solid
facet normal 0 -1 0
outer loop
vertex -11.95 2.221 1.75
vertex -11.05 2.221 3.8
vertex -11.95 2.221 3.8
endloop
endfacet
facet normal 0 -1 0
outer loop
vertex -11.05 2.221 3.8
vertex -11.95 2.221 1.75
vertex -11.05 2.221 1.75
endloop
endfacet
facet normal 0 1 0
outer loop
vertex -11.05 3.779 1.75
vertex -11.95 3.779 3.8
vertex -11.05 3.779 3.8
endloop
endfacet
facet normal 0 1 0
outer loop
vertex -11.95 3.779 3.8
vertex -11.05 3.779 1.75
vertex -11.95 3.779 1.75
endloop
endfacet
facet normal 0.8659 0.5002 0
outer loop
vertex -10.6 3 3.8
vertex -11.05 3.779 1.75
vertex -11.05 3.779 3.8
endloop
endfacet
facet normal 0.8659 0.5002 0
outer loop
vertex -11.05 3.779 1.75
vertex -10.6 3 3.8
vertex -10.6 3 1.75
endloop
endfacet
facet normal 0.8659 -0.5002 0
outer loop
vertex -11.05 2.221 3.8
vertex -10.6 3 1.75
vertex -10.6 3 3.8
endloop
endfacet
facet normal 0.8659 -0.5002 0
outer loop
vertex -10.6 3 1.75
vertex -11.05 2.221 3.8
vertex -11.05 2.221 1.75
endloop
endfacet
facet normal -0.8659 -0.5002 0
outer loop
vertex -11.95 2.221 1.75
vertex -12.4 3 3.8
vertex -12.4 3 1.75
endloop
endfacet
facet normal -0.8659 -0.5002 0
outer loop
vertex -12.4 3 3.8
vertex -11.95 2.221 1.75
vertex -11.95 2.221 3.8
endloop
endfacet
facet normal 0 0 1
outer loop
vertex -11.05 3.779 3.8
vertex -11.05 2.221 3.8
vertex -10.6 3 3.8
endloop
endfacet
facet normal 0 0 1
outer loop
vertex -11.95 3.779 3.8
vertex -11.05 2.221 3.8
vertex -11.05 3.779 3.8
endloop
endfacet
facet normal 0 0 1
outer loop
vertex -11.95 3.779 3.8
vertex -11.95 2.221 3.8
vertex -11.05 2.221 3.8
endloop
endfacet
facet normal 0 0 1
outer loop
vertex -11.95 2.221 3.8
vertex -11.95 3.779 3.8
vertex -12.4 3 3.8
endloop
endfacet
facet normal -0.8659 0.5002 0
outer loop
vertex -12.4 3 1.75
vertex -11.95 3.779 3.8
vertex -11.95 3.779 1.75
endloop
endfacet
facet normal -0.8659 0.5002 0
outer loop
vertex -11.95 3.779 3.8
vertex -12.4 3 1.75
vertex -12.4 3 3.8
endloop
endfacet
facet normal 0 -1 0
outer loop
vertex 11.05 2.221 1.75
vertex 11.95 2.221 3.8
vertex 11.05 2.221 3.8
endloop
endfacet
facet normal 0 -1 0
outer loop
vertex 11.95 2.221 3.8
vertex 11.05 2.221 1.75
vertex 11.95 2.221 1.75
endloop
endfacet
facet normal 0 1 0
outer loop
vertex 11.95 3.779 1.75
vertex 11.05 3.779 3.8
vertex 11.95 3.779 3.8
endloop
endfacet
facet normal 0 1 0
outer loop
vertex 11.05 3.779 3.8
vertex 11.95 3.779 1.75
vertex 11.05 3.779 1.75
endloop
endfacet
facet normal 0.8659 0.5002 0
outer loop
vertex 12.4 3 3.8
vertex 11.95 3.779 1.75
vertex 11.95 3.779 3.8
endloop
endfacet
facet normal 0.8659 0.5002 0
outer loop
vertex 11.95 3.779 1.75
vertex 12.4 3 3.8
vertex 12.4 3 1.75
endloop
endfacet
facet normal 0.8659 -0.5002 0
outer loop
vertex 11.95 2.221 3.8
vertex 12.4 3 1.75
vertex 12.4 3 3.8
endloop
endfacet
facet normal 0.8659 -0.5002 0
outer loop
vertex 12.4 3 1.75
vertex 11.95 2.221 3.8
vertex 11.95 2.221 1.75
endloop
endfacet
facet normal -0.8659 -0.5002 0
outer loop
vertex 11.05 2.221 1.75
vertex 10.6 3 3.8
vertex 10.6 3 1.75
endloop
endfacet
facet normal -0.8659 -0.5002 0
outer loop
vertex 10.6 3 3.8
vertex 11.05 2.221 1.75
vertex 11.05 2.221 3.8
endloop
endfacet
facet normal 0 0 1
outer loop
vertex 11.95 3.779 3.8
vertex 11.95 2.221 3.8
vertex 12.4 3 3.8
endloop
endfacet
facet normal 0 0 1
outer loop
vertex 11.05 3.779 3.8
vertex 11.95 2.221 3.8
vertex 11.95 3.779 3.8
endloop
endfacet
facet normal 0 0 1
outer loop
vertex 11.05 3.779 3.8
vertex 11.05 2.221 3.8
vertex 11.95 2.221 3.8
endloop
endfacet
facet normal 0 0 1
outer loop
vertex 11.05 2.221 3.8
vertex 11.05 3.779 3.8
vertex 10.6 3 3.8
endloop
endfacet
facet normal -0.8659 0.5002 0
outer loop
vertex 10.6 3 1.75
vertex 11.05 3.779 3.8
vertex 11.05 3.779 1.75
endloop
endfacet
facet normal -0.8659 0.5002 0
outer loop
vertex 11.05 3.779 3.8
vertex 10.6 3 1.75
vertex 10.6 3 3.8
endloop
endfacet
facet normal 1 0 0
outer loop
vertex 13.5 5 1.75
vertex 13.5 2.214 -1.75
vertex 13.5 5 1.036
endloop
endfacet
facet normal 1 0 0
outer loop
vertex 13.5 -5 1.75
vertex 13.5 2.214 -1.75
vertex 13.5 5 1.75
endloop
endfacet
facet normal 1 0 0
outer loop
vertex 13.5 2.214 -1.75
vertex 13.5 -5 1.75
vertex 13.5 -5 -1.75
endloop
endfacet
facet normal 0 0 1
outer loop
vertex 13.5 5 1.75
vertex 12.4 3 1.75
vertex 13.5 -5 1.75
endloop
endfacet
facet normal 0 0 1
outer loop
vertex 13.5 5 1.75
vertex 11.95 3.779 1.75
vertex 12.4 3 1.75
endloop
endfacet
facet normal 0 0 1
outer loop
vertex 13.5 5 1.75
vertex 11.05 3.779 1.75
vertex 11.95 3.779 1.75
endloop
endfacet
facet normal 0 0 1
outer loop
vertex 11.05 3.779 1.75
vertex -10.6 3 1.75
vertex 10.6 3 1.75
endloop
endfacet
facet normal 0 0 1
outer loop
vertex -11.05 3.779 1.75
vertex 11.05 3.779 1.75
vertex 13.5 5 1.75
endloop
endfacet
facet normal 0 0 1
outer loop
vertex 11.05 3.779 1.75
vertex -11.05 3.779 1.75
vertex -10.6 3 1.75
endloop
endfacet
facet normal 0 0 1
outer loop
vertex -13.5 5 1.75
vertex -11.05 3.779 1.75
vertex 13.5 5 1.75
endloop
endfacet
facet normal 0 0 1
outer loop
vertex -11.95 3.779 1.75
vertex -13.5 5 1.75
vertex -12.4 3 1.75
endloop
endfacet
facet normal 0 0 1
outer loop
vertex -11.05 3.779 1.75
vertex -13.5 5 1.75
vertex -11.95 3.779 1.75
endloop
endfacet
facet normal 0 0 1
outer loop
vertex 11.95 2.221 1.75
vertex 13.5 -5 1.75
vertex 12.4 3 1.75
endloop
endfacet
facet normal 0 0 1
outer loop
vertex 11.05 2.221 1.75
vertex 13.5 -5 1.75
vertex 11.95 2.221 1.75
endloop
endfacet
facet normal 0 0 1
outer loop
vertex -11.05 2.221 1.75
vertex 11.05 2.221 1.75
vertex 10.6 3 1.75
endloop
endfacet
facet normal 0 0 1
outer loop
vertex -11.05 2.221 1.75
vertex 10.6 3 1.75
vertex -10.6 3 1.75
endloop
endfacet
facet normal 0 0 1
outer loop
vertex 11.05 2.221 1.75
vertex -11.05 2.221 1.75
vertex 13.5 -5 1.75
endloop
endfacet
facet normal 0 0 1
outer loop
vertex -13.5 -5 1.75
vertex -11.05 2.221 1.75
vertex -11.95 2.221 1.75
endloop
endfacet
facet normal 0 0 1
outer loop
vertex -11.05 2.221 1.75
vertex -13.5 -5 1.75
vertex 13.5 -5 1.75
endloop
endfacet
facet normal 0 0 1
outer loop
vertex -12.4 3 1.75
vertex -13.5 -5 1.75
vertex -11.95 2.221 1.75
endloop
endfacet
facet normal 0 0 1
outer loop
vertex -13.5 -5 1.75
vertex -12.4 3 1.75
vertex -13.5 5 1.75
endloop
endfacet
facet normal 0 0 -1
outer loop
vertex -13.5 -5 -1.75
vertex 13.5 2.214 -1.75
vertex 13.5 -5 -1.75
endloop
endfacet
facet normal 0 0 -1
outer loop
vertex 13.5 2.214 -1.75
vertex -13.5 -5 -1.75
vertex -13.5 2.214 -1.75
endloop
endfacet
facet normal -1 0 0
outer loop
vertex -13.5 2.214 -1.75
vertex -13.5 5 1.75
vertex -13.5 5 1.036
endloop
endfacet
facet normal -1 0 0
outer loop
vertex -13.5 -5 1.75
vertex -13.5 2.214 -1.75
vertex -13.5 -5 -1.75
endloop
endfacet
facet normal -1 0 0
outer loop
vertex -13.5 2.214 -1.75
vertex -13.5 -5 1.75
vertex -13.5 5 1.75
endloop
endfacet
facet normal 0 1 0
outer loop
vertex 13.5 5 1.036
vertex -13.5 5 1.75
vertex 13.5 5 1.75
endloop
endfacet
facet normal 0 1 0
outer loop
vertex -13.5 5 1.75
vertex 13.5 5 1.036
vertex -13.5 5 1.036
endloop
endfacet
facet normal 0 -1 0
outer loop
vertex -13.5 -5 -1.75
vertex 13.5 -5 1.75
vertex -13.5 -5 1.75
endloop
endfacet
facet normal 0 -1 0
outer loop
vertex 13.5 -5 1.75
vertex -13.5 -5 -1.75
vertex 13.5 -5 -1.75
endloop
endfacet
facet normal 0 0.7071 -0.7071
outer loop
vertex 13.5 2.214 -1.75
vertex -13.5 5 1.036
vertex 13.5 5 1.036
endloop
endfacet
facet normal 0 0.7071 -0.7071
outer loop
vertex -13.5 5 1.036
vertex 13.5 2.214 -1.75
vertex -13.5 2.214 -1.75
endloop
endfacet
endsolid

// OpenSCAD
body=[27,10,3.5];
hole_d=1.8;
hole_h=2.0;
hole_dist=23.0;

hdmi_width=17;
hdmi_height=14;
audio_width=5;
audio_height=13;
voltage_width=8;
voltage_height=7;

difference()
{
  union()
  {
    cube(body,center=true);
    // screw pins
    for(i=[-1:2:1])
      translate([hole_dist/2*i,3,body[2]/2+hole_h/2])
      cylinder(d=hole_d,h=hole_h+0.1,$fn=6,center=true);
  }
  // cut clearing for ribbon cable
  if(0)
  translate([0,0,body[2]/2])
    cube([hole_dist-5,20,2],center=true);
  // cut bottom stand
  // dip switch 
  // hdmi capacitors
  if(0)
  translate([-hole_dist/2+hdmi_width/2-3,+5,-body[2]/2])
    cube([hdmi_width,10,hdmi_height],center=true);
  // voltage selector
  if(0)
  translate([+hole_dist/2-voltage_width/2+0.01,-6,-body[2]/2])
    cube([voltage_width,10,voltage_height],center=true);
  // audio jack
  if(0)
  translate([hole_dist/2+audio_width/2,0,-body[2]/2])
    cube([audio_width,10,audio_height],center=true);
  // 45 deg transtion
  if(1)
  translate([0,7.5,0])
    rotate([45,0,0])
      cube([40,40,audio_width],center=true);
}
